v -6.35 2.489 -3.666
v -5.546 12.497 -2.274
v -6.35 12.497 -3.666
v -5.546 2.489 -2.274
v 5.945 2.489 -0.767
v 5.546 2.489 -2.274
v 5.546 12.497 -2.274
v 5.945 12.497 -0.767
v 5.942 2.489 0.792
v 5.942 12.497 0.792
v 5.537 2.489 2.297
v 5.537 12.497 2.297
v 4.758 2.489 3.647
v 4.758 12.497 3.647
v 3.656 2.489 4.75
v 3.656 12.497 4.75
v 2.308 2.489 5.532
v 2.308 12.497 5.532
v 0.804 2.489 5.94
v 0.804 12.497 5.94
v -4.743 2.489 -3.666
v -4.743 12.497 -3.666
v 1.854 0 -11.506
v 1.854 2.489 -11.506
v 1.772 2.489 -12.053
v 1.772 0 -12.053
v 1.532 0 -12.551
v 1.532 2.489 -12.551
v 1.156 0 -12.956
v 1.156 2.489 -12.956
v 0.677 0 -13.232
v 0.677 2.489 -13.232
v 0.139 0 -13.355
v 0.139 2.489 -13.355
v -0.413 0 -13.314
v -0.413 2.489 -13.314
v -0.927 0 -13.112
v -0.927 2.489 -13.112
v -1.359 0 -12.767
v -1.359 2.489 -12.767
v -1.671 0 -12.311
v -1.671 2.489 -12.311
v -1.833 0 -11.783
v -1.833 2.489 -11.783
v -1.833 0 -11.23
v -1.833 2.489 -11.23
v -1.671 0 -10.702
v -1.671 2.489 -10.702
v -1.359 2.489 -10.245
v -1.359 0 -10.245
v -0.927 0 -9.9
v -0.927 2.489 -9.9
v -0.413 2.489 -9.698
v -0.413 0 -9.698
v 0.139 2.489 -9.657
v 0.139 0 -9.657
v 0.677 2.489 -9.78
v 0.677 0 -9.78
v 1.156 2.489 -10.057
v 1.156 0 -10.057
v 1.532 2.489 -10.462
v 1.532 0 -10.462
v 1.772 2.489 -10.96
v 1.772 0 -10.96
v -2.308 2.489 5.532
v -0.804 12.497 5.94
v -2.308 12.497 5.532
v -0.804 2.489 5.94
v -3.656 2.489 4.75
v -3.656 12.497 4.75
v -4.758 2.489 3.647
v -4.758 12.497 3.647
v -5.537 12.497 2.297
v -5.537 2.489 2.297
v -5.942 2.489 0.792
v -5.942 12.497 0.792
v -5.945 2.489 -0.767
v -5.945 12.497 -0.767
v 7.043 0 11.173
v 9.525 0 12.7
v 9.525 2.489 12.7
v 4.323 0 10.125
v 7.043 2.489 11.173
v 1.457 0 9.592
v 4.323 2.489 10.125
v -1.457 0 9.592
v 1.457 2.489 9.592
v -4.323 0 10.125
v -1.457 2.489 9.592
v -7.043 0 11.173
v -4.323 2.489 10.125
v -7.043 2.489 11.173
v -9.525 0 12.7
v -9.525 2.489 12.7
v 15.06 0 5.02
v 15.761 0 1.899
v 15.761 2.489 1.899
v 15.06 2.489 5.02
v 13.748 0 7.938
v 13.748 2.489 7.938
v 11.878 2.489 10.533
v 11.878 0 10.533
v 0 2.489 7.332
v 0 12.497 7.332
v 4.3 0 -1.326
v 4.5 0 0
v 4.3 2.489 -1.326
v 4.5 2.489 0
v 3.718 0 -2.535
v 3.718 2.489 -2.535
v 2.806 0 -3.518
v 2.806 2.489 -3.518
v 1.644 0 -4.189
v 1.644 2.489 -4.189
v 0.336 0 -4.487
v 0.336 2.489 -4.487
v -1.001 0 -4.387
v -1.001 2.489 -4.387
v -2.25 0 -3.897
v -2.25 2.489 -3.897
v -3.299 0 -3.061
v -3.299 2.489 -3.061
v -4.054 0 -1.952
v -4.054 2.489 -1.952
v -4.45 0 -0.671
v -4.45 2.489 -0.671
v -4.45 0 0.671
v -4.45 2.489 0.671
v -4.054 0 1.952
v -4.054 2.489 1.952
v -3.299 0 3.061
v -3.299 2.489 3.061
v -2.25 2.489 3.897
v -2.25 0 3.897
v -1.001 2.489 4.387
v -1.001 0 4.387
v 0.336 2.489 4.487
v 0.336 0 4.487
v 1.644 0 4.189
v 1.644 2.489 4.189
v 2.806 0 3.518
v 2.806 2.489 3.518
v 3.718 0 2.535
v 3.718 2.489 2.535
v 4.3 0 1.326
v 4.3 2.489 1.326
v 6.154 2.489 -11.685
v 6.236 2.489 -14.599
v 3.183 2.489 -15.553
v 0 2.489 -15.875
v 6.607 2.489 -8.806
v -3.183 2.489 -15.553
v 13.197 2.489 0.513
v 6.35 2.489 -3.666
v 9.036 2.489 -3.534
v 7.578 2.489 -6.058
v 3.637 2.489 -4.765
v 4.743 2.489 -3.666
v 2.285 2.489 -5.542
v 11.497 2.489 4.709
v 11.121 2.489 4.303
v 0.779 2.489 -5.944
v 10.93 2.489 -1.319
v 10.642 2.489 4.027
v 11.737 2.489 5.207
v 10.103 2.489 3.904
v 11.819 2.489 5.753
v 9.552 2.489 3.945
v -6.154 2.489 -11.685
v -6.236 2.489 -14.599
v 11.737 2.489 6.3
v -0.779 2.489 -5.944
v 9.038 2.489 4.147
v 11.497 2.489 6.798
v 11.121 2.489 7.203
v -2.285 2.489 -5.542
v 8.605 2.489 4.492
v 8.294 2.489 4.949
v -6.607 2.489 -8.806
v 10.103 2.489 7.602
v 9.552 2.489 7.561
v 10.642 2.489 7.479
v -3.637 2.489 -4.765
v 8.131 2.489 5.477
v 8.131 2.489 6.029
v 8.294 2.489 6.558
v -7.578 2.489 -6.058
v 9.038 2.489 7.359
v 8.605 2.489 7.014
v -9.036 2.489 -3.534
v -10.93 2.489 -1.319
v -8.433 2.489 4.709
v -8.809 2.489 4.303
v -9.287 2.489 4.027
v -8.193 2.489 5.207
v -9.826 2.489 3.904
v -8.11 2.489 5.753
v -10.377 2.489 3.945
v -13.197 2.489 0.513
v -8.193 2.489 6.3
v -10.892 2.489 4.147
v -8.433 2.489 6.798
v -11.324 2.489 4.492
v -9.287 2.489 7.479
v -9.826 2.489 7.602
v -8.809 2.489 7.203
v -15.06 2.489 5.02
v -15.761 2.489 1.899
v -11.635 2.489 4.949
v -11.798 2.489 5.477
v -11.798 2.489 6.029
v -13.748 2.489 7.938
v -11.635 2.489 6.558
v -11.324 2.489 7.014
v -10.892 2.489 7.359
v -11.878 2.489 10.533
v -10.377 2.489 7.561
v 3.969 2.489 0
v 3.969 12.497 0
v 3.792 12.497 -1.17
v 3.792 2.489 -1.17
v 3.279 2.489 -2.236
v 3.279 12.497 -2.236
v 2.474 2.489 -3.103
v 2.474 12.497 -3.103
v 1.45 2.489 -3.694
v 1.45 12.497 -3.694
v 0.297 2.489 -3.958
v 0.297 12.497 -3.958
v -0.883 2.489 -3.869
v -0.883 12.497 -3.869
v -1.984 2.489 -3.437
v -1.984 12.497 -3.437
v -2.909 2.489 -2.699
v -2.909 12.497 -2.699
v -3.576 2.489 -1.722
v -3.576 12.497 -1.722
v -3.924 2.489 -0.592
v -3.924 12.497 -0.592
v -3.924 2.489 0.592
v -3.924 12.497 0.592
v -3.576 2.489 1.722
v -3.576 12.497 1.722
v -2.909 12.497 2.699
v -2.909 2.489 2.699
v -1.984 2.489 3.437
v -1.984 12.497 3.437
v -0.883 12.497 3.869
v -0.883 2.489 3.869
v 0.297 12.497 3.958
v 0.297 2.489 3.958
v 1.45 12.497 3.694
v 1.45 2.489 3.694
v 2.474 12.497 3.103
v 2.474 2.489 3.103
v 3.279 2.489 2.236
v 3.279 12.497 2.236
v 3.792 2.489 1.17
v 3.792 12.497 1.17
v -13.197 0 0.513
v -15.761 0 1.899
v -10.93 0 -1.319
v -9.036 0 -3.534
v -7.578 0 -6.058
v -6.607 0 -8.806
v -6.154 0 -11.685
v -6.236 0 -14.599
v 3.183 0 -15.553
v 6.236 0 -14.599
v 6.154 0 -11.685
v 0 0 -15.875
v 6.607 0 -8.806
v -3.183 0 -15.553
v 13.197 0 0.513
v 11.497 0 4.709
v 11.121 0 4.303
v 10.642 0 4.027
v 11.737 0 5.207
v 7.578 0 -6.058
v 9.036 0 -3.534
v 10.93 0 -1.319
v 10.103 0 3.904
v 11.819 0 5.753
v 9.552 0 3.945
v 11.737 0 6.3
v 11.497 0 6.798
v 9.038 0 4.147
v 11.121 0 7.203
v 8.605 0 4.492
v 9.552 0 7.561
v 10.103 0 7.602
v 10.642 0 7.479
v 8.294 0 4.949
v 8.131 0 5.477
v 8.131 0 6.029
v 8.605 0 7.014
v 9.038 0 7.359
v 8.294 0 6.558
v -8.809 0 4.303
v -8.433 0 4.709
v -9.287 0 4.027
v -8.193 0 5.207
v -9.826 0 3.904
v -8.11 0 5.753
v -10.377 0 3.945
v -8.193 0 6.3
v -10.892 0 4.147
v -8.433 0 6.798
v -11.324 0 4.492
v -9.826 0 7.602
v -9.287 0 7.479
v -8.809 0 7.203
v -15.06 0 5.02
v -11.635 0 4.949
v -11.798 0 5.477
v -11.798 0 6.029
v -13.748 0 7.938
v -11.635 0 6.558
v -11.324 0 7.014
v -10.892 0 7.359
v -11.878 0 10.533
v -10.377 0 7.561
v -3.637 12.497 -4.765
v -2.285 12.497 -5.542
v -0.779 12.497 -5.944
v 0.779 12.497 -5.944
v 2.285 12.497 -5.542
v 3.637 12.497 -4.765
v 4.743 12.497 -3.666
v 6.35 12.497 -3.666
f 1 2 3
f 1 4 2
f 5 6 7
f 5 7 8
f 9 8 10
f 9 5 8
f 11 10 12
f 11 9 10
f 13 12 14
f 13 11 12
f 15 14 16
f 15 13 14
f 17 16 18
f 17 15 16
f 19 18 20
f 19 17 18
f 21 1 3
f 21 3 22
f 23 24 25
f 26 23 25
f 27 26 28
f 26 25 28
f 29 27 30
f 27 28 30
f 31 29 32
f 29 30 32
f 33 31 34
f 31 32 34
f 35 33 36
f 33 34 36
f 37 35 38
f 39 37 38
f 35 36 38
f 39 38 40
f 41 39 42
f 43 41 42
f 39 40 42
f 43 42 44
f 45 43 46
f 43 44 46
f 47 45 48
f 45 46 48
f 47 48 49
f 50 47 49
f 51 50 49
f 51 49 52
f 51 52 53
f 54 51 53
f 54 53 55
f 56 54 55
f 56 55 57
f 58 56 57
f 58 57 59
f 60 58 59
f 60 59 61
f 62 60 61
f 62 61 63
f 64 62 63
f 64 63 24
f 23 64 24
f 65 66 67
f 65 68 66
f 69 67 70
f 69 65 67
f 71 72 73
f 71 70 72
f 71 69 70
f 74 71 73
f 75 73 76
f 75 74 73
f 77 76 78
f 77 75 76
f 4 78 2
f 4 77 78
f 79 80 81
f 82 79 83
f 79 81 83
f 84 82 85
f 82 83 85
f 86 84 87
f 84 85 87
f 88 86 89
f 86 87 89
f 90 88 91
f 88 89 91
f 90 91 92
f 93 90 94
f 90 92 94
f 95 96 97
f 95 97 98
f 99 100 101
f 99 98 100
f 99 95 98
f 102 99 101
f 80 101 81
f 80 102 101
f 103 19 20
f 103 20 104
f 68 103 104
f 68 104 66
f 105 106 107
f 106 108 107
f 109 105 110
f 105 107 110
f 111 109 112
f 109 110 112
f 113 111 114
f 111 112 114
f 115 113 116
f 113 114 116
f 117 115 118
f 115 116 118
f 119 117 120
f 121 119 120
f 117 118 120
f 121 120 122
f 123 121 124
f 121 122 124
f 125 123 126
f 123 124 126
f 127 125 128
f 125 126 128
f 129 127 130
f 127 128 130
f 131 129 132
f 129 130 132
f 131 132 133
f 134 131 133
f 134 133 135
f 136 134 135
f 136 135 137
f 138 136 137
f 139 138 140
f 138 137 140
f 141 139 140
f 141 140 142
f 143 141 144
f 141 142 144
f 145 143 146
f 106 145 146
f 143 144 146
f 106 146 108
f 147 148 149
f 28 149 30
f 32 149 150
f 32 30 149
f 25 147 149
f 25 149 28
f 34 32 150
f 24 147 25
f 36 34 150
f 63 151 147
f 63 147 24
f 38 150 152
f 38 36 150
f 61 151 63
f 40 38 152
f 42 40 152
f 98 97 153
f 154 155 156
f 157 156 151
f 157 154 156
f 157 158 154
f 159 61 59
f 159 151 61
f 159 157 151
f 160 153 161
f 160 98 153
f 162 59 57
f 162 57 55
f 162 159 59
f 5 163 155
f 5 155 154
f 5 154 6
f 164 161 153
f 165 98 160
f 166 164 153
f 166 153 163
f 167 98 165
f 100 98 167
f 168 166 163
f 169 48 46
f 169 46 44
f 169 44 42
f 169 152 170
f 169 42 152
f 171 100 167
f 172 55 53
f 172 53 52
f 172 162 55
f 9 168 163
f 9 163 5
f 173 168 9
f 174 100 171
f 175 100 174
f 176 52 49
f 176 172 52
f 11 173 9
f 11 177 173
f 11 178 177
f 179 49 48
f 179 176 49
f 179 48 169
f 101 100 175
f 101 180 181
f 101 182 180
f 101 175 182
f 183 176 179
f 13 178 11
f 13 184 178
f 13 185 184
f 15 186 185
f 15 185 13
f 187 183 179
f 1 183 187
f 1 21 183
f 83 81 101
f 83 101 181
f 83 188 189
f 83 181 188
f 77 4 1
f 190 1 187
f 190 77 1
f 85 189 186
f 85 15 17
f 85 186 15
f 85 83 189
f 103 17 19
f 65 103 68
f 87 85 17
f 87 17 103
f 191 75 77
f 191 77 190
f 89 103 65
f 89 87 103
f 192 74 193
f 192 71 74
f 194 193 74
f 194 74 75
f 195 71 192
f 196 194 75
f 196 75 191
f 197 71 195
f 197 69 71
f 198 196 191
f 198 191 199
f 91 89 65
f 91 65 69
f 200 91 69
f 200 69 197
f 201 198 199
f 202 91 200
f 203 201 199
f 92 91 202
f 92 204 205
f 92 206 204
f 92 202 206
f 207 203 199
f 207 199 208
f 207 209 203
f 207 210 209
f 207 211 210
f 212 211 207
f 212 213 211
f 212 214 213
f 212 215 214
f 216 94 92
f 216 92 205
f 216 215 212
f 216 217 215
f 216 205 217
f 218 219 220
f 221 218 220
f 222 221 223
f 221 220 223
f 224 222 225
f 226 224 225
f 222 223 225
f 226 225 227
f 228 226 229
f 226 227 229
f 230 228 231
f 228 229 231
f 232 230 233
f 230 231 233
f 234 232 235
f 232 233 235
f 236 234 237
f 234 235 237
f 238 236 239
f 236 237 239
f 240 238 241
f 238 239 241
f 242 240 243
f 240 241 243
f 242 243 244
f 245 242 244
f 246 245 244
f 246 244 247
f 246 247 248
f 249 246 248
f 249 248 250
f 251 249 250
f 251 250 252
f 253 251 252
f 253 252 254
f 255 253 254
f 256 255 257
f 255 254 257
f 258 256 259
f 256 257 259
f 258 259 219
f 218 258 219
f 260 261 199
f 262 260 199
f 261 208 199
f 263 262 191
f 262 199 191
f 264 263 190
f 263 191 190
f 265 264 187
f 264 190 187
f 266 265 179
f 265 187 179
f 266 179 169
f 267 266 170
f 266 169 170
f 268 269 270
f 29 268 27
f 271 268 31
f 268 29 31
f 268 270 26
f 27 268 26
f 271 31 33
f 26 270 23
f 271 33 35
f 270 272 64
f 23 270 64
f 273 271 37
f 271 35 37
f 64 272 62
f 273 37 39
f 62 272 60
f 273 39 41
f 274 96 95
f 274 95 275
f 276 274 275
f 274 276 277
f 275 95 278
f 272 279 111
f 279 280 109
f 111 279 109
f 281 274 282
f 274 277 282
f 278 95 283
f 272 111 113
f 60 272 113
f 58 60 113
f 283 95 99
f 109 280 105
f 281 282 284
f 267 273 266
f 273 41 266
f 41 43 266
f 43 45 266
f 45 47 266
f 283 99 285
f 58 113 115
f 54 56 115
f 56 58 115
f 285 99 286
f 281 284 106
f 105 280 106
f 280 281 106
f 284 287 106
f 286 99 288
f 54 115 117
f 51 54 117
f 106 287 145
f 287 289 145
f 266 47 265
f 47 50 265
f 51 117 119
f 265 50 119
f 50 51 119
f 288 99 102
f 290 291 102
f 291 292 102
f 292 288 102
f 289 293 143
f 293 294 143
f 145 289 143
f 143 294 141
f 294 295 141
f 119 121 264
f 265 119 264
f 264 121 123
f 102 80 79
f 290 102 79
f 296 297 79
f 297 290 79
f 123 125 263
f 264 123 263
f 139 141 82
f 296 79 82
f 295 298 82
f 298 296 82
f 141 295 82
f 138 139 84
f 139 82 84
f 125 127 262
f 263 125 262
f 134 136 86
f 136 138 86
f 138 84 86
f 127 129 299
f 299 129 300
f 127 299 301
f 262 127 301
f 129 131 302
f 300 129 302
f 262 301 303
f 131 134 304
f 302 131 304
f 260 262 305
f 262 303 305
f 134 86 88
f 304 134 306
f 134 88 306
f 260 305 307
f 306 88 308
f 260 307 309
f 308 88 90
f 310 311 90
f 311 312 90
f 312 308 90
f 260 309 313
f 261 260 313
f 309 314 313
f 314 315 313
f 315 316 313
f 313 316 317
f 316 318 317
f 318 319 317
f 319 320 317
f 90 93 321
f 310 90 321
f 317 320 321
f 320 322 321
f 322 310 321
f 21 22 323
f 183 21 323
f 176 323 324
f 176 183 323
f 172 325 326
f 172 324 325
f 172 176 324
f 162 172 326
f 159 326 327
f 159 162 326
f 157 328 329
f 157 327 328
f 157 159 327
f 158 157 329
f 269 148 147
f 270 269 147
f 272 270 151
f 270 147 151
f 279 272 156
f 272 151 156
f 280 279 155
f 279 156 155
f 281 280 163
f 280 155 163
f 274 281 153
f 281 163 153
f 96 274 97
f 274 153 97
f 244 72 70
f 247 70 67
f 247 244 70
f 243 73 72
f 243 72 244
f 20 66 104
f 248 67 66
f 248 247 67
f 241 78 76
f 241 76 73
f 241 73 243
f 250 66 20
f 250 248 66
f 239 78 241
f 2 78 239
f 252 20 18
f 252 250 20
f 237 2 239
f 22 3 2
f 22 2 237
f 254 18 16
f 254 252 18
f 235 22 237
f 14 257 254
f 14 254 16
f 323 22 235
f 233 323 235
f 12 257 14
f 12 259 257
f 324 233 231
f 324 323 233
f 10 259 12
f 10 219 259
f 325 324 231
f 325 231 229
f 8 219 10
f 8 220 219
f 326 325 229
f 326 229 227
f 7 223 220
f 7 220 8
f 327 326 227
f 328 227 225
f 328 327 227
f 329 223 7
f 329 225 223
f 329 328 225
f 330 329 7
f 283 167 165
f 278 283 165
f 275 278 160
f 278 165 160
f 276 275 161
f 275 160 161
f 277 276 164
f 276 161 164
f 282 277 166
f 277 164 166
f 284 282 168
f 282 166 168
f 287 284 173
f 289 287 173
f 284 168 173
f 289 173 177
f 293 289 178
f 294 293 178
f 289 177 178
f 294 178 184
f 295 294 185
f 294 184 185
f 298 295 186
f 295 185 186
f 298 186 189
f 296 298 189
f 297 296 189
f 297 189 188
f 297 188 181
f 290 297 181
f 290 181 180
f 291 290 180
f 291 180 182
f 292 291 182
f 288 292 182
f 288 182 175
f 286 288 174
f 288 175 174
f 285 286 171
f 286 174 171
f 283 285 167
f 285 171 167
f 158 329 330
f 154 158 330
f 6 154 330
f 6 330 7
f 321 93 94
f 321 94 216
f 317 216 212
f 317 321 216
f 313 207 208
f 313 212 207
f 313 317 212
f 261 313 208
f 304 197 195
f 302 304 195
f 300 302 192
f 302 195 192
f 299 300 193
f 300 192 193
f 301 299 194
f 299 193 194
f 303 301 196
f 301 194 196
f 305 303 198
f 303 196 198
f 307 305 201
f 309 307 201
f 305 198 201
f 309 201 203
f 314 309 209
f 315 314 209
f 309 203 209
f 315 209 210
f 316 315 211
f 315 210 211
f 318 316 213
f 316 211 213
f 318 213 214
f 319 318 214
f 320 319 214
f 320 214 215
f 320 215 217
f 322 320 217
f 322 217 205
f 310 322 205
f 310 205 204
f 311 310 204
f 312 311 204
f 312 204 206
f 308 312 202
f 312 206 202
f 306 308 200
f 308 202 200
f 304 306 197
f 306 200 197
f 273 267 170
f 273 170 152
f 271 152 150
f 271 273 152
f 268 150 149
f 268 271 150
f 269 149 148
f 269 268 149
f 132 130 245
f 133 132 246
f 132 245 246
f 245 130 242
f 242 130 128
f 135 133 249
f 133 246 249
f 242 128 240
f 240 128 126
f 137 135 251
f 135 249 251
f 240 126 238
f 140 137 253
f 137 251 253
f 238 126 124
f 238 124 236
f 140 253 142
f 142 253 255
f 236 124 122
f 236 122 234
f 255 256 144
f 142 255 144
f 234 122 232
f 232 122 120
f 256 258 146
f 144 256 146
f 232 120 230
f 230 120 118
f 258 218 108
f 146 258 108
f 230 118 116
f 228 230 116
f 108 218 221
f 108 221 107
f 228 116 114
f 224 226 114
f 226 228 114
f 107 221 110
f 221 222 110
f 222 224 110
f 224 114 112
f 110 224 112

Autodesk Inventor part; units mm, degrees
ref_plane "YZ Plane" through (0, 0, 0) normal (1, 0, 0) x (0, 1, 0)
ref_plane "XZ Plane" through (0, 0, 0) normal (0, 1, 0) x (-1, 0, 0)
ref_plane "XY Plane" through (0, 0, 0) normal (0, 0, 1) x (1, 0, 0)
sketch "Sketch1" plane through (0, 0, 0) normal (0, 1, 0) x (-1, 0, 0)
  circle A0 centre (0, 0) radius 15.875
  dimension "d0" = 31.75
extrude "Extrusion1" add sketch "Sketch1" along normal blind 2.4892
sketch "Sketch2" plane through (0, 2.4892, 0) normal (0, 1, 0) x (1, 0, 0)
  circle A0 centre (0, 0) radius 15.875 projected
  circle A1 centre (0, 11.5062) radius 1.8542
  line L0 (0, 0) -> (0, 15.875)
  circle A2 centre (-9.9647, -5.7531) radius 1.8542
  circle A3 centre (9.9647, -5.7531) radius 1.8542
  circle A4 centre (0, -25.4) radius 15.875
  line L1 (0, 0) -> (0, -25.4)
  circle A5 centre (21.997, 12.7) radius 15.875
  circle A6 centre (-21.997, 12.7) radius 15.875
  dimension "d3" = 3.7084
  dimension "d4" = 11.5062
  dimension "d7" = 360
  dimension "d9" = 31.75
  dimension "d10" = 25.4
  dimension "d13" = 360
extrude "Extrusion2" cut sketch "Sketch2" against normal through all contours A0 A5 | A0 A5 | A4 A0 | A0 L1 A4 | A6 A0 | A0 A6 | A0 A4 L1
sketch "Sketch6" plane through (0, 2.4892, 0) normal (0, 1, 0) x (1, 0, 0)
  arc A0 (-15.761, -1.8989) -> (-9.525, -12.7) centre (0, 0) ccw projected
  arc A1 (6.236, 14.5989) -> (-6.236, 14.5989) centre (0, 0) ccw projected
  line L0 (0, 0) -> (0, 11.5062)
  circle A2 centre (0, 11.5062) radius 1.8542
  circle A3 centre (-9.9647, -5.7531) radius 1.8542
  circle A4 centre (9.9647, -5.7531) radius 1.8542
  arc A5 (9.525, -12.7) -> (15.761, -1.8989) centre (0, 0) ccw projected
  circle A6 centre (0, 0) radius 4.5
  dimension "d26" = 11.5062
  dimension "d27" = 3.7084
  dimension "d30" = 360
  dimension "d34" = 9
extrude "Extrusion5" cut sketch "Sketch6" against normal through all
sketch "Sketch3" plane through (0, 2.4892, 0) normal (0, 1, 0) x (1, 0, 0)
  arc A0 (9.525, -12.7) -> (15.761, -1.8989) centre (0, 0) ccw projected
  circle A1 centre (0, 0) radius 5.9944
  line L0 (0, -7.3323) -> (-6.35, 3.6662)
  line L1 (-6.35, 3.6662) -> (6.35, 3.6662)
  line L2 (6.35, 3.6662) -> (0, -7.3323)
  line L3 (0, 0) -> (0, -8.4562)
  dimension "d17" = 11.9888
  dimension "d18" = 12.7
extrude "Extrusion3" add sketch "Sketch3" along normal blind 10.0076
sketch "Sketch4" plane through (0, 12.4968, 0) normal (0, 1, 0) x (1, 0, 0)
  arc A0 (-5.5463, 2.2741) -> (-0.8037, -5.9403) centre (0, 0) ccw projected
  circle A1 centre (0, 0) radius 3.9687
  dimension "d21" = 7.9375
extrude "Extrusion4" cut sketch "Sketch4" against normal through all
thread "Thread1" size "5/16-18 UNC" class "2B" standard "ANSI Unified Screw Threads" full length
properties part number "5_16_18_tee_nut"
